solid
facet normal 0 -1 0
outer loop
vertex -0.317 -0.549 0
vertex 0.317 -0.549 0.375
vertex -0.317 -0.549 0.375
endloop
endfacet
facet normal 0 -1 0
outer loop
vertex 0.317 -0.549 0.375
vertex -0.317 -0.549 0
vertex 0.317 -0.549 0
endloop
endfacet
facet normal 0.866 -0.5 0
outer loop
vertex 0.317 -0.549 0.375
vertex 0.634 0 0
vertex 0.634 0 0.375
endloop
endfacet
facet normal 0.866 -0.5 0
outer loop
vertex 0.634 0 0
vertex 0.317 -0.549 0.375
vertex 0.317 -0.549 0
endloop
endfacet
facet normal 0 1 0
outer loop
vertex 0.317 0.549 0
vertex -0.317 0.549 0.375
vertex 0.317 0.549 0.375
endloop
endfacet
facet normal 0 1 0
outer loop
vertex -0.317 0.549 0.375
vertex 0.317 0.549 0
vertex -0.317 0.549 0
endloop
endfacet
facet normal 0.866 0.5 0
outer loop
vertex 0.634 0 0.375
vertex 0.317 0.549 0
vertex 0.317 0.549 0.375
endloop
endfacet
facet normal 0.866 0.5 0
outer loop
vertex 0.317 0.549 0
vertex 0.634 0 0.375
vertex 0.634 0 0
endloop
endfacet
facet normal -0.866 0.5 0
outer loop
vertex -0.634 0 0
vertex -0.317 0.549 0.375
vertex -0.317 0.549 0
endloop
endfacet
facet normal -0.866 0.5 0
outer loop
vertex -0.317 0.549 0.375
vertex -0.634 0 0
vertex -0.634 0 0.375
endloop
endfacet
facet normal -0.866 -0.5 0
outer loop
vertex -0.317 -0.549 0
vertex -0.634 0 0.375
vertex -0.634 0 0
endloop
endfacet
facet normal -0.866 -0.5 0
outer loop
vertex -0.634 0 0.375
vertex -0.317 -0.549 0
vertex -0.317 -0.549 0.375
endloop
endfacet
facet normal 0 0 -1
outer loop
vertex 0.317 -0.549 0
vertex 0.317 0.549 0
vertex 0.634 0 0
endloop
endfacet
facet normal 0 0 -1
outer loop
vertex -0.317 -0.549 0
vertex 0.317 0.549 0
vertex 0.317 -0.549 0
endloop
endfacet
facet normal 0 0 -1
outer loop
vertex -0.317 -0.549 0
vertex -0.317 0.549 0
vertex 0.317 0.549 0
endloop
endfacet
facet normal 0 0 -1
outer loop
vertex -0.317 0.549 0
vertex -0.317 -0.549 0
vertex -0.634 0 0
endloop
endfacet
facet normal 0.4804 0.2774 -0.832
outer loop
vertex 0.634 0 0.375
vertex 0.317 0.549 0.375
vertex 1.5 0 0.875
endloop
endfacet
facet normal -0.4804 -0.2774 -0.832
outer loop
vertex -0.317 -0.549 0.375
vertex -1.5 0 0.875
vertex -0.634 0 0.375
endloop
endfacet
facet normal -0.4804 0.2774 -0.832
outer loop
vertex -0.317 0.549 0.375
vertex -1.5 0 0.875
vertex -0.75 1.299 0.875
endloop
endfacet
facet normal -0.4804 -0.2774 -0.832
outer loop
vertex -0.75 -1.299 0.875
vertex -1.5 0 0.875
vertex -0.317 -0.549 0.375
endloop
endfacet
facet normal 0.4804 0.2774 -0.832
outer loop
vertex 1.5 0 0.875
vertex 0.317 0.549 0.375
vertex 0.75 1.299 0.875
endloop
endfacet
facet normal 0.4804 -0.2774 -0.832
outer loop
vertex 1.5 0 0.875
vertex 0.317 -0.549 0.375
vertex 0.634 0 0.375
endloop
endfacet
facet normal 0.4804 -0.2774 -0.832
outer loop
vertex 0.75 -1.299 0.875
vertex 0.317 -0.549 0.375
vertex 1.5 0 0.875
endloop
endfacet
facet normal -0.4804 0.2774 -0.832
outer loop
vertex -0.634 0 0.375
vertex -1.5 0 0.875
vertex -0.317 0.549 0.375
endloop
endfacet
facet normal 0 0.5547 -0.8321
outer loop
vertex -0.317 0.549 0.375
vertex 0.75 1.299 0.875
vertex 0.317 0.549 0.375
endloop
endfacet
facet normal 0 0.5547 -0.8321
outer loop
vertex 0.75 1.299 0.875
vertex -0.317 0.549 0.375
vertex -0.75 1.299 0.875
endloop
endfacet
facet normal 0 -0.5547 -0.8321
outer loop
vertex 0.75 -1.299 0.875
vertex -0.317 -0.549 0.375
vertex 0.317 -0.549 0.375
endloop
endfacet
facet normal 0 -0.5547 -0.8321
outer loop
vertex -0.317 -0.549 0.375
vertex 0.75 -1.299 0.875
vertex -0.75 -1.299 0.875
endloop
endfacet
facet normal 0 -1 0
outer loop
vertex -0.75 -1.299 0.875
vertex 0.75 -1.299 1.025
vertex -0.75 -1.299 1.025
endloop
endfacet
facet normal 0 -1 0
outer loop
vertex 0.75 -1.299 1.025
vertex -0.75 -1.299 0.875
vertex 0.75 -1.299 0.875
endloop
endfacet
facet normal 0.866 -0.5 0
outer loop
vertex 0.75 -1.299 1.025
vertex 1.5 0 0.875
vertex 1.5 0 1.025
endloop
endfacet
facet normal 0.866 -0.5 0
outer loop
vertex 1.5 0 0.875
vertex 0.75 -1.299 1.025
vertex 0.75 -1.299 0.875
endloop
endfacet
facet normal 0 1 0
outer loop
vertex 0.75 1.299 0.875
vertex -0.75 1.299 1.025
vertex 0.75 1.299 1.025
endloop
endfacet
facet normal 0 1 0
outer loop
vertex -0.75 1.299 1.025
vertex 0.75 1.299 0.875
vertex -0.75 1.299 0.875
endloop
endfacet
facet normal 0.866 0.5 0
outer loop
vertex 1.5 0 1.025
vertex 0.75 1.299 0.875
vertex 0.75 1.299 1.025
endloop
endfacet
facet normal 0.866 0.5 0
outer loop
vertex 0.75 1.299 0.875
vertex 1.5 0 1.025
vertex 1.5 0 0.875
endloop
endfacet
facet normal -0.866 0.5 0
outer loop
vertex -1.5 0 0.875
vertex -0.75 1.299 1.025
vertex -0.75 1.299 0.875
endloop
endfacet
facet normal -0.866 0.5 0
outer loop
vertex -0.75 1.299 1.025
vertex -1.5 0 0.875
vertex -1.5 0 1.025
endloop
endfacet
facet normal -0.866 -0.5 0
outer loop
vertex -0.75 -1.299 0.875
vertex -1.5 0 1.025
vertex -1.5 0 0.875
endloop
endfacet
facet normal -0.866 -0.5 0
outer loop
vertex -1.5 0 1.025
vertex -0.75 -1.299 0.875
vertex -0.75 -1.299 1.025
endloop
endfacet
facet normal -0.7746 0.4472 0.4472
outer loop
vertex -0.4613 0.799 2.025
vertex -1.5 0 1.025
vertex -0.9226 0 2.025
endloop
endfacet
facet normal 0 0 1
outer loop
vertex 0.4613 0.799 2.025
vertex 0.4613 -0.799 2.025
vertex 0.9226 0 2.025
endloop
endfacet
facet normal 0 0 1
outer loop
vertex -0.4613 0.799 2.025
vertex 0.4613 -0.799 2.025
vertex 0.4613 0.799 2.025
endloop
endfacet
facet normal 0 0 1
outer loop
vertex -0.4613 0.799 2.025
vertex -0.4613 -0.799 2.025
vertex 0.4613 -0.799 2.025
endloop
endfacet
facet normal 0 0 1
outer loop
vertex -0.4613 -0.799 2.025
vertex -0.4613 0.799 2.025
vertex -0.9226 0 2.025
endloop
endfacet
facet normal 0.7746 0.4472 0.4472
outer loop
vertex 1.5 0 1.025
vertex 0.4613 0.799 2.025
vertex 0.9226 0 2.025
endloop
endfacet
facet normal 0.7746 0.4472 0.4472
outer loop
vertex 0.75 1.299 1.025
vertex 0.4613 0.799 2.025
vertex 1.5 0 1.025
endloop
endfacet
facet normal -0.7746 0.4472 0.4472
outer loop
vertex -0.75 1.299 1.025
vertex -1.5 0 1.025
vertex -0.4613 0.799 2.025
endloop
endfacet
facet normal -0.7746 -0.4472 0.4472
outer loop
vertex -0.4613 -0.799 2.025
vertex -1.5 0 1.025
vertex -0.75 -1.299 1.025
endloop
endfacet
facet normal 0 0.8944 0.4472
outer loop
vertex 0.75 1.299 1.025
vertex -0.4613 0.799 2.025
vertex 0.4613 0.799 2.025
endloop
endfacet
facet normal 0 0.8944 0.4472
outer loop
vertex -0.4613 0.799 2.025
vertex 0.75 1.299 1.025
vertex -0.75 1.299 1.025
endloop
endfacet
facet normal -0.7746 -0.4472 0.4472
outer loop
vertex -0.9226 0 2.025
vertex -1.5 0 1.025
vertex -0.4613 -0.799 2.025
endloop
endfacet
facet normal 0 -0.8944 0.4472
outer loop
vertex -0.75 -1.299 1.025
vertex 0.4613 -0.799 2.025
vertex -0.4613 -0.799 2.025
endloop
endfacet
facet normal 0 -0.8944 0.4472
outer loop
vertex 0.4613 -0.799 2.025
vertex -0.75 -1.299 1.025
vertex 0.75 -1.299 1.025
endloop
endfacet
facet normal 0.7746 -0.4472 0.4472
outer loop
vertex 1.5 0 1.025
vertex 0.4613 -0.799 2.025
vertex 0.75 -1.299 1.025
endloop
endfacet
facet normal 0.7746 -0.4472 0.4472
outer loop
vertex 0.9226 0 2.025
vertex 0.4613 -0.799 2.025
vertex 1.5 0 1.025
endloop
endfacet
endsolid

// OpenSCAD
// Function to calculate radius based on angle, initial radius, and height
function calculateRadFromAngle(angle, r, height) = 
    let(norm_angle = angle % 90)
    (angle < 90)
        ? r + tan((abs(90 - norm_angle))) * height
        : r - tan((norm_angle)) * height;


module tricho(r, beta, beta_h, alpha, alpha_h, omega, omega_h, inter_h) {

    // Constants
    radius = r;

    beta_angle = beta;
    beta_angle_ref = 270 - beta_angle;
    beta_height = beta_h;   // radius / 4;

    alpha_angle = alpha;
    alpha_angle_ref = 270 - alpha_angle;
    alpha_height = alpha_h; // radius / 3

    omega_angle = omega;
    omega_angle_ref = 270 - omega_angle;
    omega_height = omega_h; // radius * 2 / 3;
    inter_height = inter_h; // radius / 10;
    segments = 6;

    // Calculating radii
    alpha_r1 = calculateRadFromAngle(alpha_angle_ref, radius, alpha_height);
    alpha_r2 = radius;
    beta_r1 = calculateRadFromAngle(beta_angle_ref, alpha_r1, beta_height);
    beta_r2 = alpha_r1;
    omega_r1 = radius;
    omega_r2 = calculateRadFromAngle(omega_angle_ref, radius, omega_height);

    // Vectors for parameters
    alpha_vector = [alpha_height, alpha_r1, alpha_r2];
    beta_vector = [beta_height, beta_r1, beta_r2];
    omega_vector = [omega_height, omega_r1, omega_r2];

    echo("Section: Beta, Radius 1:", beta_vector[1], "Radius 2:", beta_vector[2], "Height:", beta_vector[0], "Angle:", beta_angle);
    echo("Section: Alpha, Radius 1:", alpha_vector[1], "Radius 2:", alpha_vector[2], "Height:", alpha_vector[0], "Angle:", alpha_angle);
    echo("Section: Interstitial, Radius 1:", alpha_vector[2], "Radius 2:", omega_vector[1], "Height:", inter_height, "Angle: -");
    echo("Section: Omega, Radius 1:", omega_vector[1], "Radius 2:", omega_vector[2], "Height:", omega_vector[0], "Angle:", omega_angle);


    tricho_geo(alpha_vector, beta_vector, inter_height, omega_vector, segments);
}

// Function to construct the tricho model
module tricho_geo(alpha_vec, beta_vec, inter_h, omega_vec, segs) {
    alpha_h = alpha_vec[0];
    alpha_r1 = alpha_vec[1];
    alpha_r2 = alpha_vec[2];
    beta_h = beta_vec[0];
    beta_r1 = beta_vec[1];
    beta_r2 = beta_vec[2];
    omega_h = omega_vec[0];
    omega_r1 = omega_vec[1];
    omega_r2 = omega_vec[2];

    // Beta segment
    translate([0, 0, 0])
        cylinder(h = beta_h, r1 = beta_r1, r2 = beta_r2, $fn = segs);

    // Alpha segment
    translate([0, 0, beta_h])
        cylinder(h = alpha_h, r1 = alpha_r1, r2 = alpha_r2, $fn = segs);
    
    // Interstitial segment
    translate([0, 0, beta_h + alpha_h])
        cylinder(h = inter_h, r1 = alpha_r2, r2 = omega_r1, $fn = segs);

    // Omega segment
    translate([0, 0, beta_h + alpha_h + inter_h])
        cylinder(h = omega_h, r1 = omega_r1, r2 = omega_r2, $fn = segs);
}



// Tricho Params
radius = 1.5;

// Angle paramters
beta_angle = 90;
alpha_angle = 30;
omega_angle = 60;
segments = 6;

// Derived example parameters
beta_height = radius / 4;
alpha_height = radius / 3;
omega_height = radius * 2 / 3;
inter_height = radius / 10;


tricho(r=radius, beta=beta_angle, beta_h=beta_height, alpha=alpha_angle, alpha_h=alpha_height, omega=omega_angle, omega_h=omega_height, inter_h=inter_height); 
